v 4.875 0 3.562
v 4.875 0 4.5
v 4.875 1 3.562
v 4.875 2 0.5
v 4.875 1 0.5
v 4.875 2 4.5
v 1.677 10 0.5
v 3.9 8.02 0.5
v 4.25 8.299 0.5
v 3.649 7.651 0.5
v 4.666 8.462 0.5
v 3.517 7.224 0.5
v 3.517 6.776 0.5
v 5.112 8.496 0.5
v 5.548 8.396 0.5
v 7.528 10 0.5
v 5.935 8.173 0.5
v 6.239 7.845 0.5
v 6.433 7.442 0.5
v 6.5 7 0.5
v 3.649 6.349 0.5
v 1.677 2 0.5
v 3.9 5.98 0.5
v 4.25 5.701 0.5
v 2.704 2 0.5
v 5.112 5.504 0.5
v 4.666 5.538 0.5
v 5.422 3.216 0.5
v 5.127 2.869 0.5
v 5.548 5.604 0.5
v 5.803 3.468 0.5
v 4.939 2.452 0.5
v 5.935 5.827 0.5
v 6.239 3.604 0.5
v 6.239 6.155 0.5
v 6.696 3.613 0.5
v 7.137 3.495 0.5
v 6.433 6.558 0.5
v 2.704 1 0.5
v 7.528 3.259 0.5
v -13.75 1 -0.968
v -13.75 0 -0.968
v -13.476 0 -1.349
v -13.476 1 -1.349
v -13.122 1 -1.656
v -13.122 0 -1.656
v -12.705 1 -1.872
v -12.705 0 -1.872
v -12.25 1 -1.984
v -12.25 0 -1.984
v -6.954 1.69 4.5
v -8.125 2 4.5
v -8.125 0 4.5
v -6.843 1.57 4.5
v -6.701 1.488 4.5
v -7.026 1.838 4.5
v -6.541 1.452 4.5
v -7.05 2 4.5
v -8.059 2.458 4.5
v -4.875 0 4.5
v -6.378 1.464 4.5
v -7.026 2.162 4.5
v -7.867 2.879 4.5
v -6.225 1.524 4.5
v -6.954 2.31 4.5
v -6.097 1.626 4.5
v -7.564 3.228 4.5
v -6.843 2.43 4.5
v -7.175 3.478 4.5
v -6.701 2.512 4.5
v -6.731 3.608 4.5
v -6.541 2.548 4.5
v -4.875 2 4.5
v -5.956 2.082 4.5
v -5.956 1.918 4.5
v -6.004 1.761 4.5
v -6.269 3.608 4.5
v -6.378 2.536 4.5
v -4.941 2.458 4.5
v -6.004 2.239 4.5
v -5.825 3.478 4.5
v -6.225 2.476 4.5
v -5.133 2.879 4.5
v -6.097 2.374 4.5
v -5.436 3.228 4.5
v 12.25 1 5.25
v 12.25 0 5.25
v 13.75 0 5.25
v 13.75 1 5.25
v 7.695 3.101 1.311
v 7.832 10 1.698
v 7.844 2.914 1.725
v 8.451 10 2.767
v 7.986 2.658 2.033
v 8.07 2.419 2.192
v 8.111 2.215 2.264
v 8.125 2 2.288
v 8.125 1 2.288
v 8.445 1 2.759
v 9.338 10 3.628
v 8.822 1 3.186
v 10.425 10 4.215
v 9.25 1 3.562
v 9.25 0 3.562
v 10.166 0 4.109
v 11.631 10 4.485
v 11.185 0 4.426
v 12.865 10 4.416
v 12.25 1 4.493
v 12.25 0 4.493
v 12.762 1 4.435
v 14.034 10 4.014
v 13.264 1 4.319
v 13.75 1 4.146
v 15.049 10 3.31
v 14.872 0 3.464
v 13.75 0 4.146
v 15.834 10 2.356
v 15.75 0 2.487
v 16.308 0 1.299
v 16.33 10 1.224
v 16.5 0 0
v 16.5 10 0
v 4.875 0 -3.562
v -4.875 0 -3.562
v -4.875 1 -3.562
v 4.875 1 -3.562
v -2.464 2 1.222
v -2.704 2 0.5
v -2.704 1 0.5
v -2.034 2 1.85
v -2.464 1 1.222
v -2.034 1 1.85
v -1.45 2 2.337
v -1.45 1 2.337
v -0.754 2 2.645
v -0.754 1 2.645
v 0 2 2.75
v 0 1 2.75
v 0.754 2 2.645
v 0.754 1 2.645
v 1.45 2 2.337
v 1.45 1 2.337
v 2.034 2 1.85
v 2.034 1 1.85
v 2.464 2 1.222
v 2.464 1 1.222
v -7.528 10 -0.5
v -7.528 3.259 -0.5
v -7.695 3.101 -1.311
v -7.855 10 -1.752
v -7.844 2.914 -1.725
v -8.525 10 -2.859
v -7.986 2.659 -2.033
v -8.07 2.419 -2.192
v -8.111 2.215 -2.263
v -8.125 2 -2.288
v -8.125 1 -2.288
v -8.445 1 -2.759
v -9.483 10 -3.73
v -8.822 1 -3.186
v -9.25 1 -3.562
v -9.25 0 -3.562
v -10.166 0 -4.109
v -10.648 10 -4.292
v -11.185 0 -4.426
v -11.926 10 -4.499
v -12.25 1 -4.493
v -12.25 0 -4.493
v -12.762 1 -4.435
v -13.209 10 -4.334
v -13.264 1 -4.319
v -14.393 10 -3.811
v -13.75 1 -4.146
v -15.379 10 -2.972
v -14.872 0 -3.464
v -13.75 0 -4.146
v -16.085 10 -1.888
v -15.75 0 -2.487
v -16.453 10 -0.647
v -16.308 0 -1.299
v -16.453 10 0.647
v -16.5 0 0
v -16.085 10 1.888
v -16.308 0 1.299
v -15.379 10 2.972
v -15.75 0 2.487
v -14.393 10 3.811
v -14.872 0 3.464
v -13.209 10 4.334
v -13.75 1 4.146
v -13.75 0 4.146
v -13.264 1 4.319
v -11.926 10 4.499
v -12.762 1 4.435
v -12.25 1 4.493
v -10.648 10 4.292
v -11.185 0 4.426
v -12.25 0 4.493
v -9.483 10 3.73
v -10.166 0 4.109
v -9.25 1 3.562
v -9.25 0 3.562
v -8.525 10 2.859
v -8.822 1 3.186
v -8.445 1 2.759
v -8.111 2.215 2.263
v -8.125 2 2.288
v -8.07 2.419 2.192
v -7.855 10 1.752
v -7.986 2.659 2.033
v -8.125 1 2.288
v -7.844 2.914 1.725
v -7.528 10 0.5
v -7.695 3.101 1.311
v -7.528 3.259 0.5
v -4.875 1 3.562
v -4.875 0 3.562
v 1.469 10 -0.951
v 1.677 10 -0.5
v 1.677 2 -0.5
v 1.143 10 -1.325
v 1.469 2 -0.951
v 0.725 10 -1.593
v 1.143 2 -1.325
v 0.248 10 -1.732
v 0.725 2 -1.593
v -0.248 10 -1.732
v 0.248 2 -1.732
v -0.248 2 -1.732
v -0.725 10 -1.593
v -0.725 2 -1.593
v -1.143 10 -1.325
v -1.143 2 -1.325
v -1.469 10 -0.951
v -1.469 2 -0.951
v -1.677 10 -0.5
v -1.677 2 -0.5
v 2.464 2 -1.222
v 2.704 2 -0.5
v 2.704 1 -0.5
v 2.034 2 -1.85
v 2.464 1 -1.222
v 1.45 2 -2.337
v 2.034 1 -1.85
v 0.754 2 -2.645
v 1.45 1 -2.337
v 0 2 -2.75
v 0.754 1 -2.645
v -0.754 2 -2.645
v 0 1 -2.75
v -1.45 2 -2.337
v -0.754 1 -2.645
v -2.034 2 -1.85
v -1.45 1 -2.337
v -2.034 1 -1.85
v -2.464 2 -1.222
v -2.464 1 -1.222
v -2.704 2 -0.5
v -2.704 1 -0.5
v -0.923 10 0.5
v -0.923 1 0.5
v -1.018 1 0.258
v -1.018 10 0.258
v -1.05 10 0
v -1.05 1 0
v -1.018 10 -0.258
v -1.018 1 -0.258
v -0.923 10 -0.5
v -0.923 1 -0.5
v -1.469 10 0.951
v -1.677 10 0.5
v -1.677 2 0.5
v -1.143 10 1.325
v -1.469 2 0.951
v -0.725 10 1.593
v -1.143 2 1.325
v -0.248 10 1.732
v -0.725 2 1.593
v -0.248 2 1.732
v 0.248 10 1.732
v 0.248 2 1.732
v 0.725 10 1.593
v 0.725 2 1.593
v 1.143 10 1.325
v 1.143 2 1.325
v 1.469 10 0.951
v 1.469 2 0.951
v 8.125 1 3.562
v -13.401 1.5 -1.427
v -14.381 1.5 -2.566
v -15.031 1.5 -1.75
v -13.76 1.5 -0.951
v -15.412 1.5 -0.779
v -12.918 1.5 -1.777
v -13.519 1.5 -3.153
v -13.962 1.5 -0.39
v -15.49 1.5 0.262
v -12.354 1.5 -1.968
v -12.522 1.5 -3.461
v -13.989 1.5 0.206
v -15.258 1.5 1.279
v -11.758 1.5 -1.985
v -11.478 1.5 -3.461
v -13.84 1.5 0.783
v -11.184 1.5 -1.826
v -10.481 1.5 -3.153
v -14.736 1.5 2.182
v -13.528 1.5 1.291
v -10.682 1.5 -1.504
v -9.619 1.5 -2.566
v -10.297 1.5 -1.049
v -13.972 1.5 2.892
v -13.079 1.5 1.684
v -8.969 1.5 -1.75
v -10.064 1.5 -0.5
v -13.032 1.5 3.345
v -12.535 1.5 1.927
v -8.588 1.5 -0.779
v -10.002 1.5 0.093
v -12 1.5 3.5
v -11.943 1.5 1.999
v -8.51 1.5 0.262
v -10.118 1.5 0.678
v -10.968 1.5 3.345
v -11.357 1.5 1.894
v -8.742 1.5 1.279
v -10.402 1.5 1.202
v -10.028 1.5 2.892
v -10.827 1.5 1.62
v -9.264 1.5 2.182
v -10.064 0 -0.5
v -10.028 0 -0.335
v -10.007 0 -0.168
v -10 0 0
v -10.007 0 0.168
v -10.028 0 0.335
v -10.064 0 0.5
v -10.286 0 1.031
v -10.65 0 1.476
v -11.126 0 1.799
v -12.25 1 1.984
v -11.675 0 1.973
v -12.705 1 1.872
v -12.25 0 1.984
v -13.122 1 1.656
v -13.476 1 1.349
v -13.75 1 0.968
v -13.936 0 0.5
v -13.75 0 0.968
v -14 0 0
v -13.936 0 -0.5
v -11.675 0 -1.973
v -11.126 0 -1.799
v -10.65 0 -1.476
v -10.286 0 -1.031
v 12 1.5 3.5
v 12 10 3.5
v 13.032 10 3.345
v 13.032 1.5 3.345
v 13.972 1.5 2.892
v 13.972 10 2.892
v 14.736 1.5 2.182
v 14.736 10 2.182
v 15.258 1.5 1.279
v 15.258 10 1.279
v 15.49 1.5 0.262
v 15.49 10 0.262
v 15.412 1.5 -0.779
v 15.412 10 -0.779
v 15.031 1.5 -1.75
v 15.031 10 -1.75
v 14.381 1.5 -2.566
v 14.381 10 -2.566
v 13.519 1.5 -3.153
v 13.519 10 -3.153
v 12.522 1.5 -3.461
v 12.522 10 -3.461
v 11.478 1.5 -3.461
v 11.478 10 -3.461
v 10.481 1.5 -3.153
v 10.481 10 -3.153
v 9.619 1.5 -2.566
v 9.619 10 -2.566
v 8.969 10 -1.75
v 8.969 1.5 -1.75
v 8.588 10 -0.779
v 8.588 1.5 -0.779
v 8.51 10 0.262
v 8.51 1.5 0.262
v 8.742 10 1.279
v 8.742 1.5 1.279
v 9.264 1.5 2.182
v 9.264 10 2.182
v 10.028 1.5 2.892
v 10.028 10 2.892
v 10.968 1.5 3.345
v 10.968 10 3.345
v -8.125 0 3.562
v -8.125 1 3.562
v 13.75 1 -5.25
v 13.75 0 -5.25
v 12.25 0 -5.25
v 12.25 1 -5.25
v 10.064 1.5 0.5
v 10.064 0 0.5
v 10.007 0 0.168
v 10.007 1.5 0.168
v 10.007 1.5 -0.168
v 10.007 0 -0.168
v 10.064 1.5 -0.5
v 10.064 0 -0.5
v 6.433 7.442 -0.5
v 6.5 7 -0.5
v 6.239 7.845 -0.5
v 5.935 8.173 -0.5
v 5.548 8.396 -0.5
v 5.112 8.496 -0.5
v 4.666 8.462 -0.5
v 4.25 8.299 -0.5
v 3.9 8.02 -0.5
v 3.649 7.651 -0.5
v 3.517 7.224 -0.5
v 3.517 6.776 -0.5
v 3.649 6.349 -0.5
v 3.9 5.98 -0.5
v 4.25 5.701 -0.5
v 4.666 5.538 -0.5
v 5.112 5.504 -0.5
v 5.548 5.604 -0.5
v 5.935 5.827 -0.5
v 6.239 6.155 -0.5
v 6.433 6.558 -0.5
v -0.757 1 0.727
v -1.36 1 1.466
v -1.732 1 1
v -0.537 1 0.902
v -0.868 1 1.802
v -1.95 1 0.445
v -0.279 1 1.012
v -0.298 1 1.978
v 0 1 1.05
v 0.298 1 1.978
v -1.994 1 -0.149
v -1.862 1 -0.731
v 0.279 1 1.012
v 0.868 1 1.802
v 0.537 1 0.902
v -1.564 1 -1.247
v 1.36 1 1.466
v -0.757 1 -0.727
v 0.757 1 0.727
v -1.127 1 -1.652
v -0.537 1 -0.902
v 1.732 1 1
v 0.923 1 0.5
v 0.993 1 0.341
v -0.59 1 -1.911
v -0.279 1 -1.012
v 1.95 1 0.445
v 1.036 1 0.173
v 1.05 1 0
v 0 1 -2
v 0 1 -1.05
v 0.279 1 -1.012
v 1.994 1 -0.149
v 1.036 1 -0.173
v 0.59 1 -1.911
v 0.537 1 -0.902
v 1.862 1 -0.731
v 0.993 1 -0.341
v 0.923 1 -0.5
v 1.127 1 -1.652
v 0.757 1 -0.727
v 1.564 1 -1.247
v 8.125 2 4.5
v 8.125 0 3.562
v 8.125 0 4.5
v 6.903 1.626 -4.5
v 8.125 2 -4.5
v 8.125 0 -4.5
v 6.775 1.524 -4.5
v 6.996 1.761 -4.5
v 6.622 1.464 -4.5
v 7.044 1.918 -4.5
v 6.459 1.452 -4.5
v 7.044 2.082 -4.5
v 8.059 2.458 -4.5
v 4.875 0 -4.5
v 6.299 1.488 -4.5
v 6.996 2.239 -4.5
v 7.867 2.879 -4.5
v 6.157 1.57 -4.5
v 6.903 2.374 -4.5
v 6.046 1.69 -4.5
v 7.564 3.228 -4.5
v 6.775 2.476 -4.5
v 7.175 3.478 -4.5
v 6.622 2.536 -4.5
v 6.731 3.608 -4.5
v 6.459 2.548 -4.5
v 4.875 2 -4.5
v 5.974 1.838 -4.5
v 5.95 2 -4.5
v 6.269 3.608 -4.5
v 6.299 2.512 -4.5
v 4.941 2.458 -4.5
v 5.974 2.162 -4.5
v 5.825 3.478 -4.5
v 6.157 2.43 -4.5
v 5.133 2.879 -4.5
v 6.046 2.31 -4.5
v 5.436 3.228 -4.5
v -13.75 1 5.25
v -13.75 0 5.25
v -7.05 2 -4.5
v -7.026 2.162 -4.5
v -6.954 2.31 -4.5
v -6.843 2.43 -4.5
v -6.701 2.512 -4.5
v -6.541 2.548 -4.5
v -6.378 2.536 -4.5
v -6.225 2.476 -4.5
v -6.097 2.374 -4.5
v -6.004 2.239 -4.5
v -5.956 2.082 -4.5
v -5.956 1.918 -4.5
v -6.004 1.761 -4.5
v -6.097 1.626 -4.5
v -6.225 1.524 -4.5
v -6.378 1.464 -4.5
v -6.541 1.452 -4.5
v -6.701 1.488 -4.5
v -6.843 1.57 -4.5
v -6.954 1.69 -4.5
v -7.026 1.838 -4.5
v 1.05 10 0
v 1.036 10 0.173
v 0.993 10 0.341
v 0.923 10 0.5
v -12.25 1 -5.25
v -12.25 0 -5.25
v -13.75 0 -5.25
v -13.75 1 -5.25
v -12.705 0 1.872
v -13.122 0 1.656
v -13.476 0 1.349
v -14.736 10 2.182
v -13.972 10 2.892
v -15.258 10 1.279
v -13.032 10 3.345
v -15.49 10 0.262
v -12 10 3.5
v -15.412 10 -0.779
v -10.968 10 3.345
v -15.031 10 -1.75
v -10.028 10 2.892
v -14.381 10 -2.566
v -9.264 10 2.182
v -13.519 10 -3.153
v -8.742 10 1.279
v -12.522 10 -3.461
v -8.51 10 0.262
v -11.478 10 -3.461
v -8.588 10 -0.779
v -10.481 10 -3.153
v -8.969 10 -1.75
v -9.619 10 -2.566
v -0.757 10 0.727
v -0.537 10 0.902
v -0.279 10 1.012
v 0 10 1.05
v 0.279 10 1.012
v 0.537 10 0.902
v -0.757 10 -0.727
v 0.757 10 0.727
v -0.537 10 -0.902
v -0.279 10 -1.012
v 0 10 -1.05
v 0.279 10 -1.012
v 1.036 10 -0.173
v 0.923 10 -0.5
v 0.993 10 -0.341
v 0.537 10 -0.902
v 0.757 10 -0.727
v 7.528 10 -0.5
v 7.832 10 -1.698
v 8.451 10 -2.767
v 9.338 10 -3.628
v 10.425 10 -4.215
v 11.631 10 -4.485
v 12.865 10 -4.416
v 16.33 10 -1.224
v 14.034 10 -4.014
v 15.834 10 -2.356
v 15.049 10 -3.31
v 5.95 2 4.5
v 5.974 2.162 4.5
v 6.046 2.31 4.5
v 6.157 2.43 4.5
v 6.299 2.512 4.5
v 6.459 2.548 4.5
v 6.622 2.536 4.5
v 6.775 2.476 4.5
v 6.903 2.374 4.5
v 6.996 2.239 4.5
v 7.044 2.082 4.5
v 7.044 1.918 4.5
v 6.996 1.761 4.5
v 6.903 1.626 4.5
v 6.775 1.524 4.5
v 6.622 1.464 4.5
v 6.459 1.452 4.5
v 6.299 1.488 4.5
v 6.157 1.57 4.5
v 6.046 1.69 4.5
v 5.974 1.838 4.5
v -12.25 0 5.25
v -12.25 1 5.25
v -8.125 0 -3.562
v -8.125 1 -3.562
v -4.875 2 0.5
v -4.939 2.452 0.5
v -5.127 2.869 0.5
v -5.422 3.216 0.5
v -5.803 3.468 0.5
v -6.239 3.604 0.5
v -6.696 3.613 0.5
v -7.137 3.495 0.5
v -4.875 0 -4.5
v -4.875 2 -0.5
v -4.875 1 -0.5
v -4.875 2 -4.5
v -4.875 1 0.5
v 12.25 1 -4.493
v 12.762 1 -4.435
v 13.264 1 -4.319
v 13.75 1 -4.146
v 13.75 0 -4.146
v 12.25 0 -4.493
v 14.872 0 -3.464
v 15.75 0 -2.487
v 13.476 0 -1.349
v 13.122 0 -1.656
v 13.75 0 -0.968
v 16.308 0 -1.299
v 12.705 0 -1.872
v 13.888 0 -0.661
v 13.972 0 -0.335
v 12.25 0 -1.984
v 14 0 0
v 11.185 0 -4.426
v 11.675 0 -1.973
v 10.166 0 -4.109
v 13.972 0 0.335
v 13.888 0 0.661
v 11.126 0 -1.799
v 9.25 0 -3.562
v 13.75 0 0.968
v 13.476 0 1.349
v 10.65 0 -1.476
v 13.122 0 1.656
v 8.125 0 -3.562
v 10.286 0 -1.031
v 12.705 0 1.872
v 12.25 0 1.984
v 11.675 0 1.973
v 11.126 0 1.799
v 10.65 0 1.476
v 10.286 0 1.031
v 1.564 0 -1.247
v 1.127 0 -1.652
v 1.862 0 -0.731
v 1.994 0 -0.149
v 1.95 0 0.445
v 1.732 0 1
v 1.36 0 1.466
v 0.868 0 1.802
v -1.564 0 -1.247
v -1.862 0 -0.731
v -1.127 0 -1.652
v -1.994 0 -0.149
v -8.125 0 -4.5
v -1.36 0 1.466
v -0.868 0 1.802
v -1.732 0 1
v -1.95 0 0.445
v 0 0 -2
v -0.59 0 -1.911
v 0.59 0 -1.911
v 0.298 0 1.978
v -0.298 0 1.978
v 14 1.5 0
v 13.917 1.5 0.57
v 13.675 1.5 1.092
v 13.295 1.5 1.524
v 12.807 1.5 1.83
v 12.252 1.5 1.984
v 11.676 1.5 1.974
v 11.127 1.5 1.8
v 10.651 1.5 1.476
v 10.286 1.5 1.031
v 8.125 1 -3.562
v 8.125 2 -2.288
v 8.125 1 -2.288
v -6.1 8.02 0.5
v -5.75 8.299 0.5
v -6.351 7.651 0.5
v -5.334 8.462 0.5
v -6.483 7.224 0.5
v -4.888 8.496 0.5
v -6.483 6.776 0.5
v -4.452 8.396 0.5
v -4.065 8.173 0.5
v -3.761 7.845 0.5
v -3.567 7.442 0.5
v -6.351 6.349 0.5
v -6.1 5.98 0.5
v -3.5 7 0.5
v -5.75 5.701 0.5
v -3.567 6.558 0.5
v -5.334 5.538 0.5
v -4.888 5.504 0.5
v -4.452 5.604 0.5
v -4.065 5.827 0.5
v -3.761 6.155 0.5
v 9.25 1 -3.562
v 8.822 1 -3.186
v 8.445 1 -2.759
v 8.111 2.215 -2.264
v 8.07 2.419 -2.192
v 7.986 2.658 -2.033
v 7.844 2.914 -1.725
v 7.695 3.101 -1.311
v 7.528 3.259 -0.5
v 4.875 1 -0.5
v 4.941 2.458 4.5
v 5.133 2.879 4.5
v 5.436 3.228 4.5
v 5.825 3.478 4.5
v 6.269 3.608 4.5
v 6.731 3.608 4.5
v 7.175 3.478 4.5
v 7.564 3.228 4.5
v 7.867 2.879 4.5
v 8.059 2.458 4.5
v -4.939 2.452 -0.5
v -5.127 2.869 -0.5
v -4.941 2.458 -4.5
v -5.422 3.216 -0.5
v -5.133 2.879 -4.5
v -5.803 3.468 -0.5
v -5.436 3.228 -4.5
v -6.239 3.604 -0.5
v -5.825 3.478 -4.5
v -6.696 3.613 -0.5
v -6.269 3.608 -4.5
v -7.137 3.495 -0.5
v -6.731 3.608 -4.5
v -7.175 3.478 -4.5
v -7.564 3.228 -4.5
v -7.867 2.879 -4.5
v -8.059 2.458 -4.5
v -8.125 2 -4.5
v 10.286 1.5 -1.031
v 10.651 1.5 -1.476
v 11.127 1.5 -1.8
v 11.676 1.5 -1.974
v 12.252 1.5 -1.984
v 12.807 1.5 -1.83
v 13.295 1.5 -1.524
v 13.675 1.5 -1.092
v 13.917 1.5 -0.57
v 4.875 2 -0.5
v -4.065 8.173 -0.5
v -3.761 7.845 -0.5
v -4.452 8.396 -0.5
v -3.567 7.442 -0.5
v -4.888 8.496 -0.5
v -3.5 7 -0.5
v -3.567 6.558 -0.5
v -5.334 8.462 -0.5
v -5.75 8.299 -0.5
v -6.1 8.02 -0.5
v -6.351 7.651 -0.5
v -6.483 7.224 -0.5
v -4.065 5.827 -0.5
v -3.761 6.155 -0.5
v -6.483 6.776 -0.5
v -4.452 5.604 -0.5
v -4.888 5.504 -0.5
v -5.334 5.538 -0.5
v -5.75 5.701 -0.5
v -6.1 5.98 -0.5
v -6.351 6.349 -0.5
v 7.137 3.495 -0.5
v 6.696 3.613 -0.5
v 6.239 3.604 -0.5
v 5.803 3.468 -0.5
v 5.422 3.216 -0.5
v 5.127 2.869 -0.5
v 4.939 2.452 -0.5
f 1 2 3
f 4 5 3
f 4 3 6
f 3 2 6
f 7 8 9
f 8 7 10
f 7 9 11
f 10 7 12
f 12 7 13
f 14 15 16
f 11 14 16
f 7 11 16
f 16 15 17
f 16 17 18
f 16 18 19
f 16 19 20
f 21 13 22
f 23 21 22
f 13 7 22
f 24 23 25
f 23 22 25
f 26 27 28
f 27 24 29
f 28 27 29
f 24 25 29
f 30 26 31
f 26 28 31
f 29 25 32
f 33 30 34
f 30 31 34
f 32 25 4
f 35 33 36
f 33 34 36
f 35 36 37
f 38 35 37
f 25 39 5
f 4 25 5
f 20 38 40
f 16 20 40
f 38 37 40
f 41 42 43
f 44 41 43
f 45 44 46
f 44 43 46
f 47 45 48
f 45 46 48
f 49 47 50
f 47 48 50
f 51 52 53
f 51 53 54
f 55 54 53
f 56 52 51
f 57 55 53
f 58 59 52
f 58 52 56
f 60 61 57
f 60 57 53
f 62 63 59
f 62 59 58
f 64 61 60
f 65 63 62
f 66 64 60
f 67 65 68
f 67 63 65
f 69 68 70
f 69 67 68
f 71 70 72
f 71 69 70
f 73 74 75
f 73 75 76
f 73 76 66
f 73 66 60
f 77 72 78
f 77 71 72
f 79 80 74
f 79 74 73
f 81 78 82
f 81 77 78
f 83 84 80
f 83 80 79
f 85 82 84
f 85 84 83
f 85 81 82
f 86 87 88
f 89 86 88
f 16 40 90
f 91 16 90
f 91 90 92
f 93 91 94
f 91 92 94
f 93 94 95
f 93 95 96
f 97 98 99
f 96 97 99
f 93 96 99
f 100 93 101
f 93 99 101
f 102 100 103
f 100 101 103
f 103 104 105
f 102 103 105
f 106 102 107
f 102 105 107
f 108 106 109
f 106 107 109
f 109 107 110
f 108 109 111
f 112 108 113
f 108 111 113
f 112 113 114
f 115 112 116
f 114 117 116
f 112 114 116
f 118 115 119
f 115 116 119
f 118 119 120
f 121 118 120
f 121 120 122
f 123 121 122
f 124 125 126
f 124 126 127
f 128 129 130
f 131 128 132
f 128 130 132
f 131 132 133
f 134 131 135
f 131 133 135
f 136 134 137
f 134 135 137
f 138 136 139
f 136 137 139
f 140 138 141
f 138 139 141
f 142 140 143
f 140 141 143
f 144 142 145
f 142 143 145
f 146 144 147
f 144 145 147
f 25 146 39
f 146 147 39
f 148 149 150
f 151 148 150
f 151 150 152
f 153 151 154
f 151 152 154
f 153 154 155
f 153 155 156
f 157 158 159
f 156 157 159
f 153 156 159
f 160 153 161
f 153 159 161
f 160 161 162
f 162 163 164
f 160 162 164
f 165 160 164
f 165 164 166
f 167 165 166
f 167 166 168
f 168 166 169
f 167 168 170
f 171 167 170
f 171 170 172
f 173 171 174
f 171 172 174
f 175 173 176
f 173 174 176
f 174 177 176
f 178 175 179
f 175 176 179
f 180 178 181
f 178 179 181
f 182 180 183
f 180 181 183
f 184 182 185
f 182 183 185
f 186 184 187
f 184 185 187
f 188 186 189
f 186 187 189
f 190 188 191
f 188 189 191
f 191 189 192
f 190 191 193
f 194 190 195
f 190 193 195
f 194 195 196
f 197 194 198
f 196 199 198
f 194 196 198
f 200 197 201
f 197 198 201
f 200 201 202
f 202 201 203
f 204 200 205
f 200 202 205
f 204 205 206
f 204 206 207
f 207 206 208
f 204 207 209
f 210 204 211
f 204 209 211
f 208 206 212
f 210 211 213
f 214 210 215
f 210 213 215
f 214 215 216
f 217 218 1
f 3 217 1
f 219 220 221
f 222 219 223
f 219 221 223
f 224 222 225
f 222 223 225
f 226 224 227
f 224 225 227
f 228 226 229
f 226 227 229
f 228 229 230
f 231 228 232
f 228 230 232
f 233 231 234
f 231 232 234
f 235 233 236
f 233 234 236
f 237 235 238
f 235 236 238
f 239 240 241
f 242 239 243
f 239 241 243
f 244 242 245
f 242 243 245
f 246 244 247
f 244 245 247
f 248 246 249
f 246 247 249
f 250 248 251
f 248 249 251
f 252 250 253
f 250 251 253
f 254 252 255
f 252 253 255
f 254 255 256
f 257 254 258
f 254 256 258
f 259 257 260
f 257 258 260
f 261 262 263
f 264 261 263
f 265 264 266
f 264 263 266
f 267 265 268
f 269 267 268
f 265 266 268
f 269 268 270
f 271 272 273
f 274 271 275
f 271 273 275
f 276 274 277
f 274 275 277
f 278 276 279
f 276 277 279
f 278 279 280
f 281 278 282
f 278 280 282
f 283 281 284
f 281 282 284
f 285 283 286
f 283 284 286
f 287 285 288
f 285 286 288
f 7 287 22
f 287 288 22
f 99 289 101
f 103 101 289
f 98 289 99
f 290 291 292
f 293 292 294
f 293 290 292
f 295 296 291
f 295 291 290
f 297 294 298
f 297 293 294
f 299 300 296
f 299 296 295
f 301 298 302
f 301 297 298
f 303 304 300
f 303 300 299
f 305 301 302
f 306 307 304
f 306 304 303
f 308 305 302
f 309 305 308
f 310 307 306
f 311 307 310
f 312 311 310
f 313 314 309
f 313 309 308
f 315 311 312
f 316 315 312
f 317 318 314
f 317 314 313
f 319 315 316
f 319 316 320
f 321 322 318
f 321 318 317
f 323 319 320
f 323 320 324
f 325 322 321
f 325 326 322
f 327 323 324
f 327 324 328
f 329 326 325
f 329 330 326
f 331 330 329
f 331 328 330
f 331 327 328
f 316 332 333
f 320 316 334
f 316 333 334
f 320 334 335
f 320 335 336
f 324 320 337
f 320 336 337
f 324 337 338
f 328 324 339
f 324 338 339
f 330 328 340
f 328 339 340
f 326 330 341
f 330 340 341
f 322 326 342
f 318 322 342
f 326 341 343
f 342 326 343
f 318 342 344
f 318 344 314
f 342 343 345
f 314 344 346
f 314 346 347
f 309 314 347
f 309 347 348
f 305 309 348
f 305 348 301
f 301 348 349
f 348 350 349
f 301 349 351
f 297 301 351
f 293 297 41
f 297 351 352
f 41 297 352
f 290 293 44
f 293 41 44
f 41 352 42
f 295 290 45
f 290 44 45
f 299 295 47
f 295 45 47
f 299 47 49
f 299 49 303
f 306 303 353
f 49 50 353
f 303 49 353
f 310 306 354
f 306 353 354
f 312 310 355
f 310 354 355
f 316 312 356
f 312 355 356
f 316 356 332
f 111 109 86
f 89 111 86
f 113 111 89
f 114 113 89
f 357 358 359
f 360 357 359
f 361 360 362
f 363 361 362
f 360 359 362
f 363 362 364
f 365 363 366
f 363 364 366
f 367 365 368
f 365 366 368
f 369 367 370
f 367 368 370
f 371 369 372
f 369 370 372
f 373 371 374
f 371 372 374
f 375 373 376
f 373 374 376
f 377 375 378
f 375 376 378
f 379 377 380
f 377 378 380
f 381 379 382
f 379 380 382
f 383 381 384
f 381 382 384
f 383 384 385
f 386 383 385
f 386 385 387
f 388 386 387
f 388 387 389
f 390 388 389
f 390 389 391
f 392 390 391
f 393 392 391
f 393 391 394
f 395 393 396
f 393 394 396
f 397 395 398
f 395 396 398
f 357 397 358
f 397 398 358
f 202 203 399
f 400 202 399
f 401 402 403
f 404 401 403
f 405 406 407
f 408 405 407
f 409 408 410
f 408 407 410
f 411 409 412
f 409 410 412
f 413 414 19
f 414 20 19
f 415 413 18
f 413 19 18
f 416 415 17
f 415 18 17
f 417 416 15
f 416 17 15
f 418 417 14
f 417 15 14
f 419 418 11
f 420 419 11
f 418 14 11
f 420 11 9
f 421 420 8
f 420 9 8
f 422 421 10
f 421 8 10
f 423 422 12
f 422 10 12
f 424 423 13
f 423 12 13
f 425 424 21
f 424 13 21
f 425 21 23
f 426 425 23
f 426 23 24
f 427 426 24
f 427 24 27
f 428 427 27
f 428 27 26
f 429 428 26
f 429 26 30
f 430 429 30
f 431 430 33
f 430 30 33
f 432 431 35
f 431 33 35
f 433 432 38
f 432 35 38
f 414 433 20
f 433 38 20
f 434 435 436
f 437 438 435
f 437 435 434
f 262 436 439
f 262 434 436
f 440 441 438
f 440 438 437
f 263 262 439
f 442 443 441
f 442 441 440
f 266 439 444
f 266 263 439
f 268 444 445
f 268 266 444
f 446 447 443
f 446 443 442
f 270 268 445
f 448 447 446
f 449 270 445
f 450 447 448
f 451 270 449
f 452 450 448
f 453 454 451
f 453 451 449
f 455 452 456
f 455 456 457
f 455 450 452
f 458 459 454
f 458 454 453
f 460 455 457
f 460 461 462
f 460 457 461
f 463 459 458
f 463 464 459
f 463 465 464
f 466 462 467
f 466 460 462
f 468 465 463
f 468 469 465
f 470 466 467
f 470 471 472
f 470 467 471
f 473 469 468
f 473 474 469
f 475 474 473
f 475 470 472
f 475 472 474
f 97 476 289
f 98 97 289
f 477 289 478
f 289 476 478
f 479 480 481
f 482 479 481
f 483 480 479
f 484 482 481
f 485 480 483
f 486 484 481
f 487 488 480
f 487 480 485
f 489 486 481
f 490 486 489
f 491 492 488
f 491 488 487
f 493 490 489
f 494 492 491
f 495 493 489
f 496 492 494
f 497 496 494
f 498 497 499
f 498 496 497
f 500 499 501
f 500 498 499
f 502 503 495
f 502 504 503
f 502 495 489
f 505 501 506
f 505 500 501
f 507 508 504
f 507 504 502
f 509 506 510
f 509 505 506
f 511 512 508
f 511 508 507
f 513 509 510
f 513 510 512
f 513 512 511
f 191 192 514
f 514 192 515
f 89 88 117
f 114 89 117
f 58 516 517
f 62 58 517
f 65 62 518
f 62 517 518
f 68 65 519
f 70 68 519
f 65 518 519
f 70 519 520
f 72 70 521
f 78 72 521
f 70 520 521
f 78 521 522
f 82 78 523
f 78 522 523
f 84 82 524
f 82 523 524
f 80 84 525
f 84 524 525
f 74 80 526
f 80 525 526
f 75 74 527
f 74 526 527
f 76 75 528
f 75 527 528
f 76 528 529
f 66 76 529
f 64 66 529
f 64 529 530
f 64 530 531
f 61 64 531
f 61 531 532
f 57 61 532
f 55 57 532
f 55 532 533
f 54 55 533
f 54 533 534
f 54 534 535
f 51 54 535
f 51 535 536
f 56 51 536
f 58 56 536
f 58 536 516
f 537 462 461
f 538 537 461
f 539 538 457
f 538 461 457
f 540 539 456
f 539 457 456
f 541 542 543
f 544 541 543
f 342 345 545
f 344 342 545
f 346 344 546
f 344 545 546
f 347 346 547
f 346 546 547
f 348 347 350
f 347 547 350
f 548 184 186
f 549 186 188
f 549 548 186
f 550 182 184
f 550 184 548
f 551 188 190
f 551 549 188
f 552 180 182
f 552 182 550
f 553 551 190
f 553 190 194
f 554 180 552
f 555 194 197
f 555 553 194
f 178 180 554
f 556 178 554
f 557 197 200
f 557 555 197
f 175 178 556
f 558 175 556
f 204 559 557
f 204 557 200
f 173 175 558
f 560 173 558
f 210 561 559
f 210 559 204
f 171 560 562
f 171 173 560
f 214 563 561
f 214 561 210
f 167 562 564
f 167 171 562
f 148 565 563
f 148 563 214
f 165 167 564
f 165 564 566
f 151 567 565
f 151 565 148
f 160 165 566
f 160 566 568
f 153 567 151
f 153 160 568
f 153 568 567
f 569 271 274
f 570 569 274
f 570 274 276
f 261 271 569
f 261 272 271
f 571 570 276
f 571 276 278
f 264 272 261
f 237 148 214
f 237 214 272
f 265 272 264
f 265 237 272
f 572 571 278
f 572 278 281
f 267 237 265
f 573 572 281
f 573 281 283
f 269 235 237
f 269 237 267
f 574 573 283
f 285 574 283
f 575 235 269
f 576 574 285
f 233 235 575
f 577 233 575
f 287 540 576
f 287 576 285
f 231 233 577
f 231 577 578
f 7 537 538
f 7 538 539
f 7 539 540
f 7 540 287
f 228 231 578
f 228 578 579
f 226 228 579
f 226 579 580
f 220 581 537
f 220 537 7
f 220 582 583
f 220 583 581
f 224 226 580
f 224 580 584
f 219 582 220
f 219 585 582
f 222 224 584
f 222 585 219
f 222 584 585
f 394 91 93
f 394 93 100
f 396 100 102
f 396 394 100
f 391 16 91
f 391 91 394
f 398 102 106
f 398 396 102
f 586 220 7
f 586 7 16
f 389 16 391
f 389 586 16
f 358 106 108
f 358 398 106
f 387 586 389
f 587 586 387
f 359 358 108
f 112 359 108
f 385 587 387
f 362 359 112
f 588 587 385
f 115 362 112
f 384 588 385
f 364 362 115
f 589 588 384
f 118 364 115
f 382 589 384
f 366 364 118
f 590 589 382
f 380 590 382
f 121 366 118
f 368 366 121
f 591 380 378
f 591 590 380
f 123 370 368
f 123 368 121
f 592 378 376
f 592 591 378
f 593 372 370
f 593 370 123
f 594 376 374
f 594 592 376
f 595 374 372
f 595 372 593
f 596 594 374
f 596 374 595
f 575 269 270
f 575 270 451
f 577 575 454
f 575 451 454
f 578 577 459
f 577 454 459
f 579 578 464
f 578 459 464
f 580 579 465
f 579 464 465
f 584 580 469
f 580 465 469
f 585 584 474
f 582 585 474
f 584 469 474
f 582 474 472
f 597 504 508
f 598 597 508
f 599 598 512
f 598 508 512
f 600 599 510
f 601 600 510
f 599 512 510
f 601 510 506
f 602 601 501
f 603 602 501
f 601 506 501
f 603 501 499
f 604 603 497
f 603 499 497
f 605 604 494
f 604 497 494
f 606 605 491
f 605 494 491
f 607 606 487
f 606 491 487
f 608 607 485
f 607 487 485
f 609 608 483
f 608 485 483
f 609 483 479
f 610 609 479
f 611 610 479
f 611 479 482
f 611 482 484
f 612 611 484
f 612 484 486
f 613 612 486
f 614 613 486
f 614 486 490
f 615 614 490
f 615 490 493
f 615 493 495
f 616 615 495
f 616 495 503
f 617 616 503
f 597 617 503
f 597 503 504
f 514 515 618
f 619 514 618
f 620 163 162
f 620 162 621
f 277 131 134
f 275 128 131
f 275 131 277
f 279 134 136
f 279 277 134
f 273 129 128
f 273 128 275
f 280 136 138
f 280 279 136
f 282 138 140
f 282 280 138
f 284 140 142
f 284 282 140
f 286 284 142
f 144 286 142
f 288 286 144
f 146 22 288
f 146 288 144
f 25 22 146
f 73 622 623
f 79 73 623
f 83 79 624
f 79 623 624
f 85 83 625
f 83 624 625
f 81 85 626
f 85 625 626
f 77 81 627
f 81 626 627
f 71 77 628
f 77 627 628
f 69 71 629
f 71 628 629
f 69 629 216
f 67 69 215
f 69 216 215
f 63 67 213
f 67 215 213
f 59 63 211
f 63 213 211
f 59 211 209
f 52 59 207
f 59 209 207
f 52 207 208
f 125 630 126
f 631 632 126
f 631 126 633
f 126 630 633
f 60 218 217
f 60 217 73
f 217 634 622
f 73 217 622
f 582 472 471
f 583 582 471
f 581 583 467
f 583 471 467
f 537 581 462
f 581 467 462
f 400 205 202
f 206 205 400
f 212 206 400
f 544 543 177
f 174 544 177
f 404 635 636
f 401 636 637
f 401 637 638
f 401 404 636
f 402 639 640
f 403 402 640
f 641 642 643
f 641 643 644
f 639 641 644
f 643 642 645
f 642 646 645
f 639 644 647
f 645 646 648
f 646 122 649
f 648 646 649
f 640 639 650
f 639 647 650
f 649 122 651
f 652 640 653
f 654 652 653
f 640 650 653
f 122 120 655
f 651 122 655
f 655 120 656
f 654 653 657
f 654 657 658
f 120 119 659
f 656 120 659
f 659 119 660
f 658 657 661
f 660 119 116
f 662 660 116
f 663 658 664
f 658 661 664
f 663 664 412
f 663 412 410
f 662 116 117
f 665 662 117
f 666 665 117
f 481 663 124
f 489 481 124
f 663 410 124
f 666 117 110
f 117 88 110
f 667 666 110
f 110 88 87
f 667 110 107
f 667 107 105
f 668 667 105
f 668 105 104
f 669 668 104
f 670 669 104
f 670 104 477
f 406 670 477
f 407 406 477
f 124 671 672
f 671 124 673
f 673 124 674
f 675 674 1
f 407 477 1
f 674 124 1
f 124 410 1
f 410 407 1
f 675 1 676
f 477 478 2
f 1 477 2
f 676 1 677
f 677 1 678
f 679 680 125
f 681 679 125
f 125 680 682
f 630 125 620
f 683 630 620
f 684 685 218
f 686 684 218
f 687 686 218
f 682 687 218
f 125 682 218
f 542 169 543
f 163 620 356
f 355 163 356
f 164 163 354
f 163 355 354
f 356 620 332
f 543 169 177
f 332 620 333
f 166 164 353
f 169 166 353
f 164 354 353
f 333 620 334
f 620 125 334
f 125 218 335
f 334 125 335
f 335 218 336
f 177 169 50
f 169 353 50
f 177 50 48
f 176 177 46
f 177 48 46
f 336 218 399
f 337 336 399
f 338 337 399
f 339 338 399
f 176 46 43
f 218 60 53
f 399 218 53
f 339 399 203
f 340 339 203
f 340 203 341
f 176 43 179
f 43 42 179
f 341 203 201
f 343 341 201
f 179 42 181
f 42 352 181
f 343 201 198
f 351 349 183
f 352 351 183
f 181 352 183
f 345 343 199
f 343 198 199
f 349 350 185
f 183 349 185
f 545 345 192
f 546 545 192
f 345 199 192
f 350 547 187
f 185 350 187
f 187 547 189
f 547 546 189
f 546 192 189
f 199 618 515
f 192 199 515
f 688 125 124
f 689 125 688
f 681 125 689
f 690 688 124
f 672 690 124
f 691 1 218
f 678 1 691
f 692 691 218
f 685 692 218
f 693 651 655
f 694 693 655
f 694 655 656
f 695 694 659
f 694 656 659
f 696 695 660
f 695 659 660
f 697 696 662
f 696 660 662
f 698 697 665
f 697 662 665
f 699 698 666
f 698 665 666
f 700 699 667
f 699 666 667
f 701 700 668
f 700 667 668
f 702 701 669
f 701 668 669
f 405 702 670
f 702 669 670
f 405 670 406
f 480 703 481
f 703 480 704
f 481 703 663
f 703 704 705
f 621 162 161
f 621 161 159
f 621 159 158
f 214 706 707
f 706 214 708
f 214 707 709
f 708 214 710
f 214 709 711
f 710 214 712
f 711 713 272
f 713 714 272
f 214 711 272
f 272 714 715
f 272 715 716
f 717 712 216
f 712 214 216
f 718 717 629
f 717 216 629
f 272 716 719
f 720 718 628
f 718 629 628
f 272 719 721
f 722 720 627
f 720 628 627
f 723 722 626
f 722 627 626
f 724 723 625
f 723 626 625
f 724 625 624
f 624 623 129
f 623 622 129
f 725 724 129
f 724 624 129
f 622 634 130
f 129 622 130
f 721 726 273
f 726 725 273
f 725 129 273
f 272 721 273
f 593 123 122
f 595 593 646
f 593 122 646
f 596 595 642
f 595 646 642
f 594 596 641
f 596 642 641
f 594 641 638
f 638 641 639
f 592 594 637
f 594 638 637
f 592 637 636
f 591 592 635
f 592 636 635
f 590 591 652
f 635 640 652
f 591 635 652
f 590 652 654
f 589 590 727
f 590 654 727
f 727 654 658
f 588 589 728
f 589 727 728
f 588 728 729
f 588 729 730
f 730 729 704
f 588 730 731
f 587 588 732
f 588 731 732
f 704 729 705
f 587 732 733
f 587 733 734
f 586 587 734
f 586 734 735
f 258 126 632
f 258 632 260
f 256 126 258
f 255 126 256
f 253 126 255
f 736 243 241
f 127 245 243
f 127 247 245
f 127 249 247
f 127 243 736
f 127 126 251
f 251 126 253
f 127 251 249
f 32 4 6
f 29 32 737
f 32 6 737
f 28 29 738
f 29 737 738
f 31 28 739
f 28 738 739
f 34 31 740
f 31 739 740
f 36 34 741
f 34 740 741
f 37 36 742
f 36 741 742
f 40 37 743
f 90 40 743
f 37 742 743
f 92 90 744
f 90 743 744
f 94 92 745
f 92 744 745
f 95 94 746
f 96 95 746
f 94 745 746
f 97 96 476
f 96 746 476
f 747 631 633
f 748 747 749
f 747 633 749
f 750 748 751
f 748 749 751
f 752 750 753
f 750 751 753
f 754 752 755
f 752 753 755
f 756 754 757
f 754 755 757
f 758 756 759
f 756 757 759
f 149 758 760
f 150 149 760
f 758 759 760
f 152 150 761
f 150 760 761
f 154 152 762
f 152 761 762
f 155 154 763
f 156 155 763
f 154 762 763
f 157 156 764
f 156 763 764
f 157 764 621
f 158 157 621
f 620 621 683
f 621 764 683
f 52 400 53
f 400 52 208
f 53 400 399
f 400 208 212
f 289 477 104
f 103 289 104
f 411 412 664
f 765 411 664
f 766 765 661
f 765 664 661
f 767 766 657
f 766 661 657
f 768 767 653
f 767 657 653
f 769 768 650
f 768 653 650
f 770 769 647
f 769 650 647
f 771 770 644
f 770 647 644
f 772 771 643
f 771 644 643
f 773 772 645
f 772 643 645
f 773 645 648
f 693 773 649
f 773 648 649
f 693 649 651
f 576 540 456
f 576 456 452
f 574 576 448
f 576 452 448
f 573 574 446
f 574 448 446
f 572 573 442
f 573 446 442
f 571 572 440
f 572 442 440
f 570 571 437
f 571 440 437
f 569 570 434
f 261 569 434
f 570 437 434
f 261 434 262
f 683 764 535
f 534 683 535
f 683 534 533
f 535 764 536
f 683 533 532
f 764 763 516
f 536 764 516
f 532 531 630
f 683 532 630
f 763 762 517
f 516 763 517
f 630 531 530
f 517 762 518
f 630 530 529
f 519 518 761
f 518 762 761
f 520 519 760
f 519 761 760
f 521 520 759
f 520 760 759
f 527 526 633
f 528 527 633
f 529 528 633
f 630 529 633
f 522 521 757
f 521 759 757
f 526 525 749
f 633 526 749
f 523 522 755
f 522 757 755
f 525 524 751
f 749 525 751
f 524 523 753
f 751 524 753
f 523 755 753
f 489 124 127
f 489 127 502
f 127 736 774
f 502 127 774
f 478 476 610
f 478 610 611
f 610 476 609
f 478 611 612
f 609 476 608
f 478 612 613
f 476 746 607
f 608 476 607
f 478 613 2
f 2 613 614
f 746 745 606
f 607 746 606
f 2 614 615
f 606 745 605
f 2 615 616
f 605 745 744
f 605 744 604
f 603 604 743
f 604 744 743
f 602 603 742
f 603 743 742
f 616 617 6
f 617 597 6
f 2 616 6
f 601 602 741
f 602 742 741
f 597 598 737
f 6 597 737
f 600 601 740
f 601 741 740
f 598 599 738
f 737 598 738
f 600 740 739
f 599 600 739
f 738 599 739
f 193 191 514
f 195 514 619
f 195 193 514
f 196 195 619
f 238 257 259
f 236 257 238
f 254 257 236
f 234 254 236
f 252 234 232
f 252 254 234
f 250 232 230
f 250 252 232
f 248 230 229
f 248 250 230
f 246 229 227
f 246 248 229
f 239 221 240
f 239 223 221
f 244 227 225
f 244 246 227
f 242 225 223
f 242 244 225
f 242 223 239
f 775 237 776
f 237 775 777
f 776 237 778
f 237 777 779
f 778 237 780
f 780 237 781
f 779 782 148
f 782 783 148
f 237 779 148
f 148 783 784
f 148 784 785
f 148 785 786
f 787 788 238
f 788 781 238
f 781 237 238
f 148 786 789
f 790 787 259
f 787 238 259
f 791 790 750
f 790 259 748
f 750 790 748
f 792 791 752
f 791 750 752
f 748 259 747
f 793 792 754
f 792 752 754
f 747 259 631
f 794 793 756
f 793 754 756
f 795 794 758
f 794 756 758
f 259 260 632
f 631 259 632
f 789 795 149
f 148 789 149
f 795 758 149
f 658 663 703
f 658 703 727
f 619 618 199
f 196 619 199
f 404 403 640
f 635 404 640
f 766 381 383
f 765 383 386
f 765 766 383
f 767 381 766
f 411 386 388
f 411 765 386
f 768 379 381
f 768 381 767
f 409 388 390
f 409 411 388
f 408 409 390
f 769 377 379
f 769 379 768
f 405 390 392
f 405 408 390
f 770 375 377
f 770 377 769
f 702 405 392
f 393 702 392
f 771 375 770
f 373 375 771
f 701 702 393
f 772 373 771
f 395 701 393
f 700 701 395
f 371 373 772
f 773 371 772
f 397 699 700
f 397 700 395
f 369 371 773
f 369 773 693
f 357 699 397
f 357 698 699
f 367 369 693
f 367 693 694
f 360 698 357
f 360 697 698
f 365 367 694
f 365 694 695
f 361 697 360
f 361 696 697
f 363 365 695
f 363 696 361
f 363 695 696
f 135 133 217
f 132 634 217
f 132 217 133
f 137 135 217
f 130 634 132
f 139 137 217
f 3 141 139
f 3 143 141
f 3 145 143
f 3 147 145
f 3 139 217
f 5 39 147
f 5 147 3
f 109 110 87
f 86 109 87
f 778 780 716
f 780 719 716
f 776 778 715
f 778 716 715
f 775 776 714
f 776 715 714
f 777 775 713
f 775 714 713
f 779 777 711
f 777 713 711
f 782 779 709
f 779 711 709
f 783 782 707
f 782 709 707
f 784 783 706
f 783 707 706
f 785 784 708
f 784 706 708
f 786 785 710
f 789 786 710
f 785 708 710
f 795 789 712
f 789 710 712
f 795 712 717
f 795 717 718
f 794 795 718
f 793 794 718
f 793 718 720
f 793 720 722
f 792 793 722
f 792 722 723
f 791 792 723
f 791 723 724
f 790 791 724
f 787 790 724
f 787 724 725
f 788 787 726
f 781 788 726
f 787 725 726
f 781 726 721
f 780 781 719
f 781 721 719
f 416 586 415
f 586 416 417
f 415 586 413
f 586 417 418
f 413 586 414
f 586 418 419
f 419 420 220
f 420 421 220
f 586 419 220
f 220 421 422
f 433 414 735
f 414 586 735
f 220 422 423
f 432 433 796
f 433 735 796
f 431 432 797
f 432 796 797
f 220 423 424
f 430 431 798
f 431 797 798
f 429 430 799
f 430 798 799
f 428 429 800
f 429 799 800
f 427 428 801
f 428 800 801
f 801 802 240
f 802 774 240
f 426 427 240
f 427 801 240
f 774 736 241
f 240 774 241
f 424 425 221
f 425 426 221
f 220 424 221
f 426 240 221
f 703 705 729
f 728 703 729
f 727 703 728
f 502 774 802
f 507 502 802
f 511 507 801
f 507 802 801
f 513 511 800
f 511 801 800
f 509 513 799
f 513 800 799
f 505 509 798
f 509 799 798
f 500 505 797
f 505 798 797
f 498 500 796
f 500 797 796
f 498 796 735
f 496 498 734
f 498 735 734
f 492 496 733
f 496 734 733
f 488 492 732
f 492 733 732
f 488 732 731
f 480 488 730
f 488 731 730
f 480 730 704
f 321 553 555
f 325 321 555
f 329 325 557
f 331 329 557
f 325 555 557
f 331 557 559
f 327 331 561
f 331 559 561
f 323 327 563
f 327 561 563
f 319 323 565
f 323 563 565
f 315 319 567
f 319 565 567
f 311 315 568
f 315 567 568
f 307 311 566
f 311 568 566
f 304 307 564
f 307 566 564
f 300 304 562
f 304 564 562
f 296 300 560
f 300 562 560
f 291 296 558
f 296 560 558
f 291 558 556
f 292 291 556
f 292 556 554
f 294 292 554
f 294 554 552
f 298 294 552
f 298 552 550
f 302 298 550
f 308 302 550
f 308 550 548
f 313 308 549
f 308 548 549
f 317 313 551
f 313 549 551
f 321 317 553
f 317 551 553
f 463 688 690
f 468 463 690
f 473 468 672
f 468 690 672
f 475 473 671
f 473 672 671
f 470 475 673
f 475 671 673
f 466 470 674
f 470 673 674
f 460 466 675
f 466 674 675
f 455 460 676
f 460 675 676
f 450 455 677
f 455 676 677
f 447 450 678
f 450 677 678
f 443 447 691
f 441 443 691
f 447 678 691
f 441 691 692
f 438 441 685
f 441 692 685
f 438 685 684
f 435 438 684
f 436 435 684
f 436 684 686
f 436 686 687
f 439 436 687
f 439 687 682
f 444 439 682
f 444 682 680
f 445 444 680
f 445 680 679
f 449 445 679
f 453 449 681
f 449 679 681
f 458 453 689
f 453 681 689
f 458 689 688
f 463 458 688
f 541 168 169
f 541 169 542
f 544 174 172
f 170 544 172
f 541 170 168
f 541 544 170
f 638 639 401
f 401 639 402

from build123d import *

# Parameters (mm, degrees)
BOSS_EXTRUDE1_DEPTH     = 10
SKETCH2_W               = 18.5
SKETCH2_H               = 7.123903424
SKETCH2_R               = 1.05
BOSS_EXTRUDE2_DEPTH     = 1
SKETCH3_R               = 3.5
CUT_EXTRUDE1_DEPTH      = 8.5
BOSS_EXTRUDE3_DEPTH     = 4.5
SKETCH5_R               = 1.5
CUT_EXTRUDE2_DEPTH      = 4.5
M1_4X0_3_TAPPED_HOLE1_D = 1.1
SKETCH7_R               = 2.75
SKETCH7_R_2             = 1.75
BOSS_EXTRUDE4_DEPTH     = 1
SKETCH8_R               = 2
CUT_EXTRUDE3_DEPTH      = 1


with BuildPart() as part:
    # Sketch1 → Boss-Extrude1 (new body)
    with BuildSketch(Plane(origin=(0, 0, 0), x_dir=(1, 0, 0), z_dir=(0, 1, 0))):
        with BuildLine():
            ThreePointArc((10.063508327, -0.5), (10, 0), (10.063508327, 0.5))
            Line((10.063508327, 0.5), (7.527864045, 0.5))
            ThreePointArc((7.527864045, 0.5), (7.5, 0), (7.527864045, -0.5))
            Line((7.527864045, -0.5), (10.063508327, -0.5))
        make_face()
        with BuildLine():
            Line((7.527864045, 0.5), (10.063508327, 0.5))
            ThreePointArc((10.063508327, 0.5), (12.252008585, 1.984059393), (14, 0))
            ThreePointArc((14, 0), (12.252008585, -1.984059393), (10.063508327, -0.5))
            Line((10.063508327, -0.5), (7.527864045, -0.5))
            ThreePointArc((7.527864045, -0.5), (12.250387902, -4.493028589), (16.5, 0))
            ThreePointArc((16.5, 0), (12.250387902, 4.493028589), (7.527864045, 0.5))
        make_face()
        with BuildLine():
            ThreePointArc((-7.5, 0), (-7.506971411, 0.250387902), (-7.527864045, 0.5))
            Line((-7.527864045, 0.5), (-10.063508327, 0.5))
            ThreePointArc((-10.063508327, 0.5), (-10.015940607, 0.252008585), (-10, 0))
            ThreePointArc((-10, 0), (-10.015940607, -0.252008585), (-10.063508327, -0.5))
            Line((-10.063508327, -0.5), (-7.527864045, -0.5))
            ThreePointArc((-7.527864045, -0.5), (-7.506971411, -0.250387902), (-7.5, 0))
        make_face()
        with BuildLine():
            Line((-10.063508327, 0.5), (-7.527864045, 0.5))
            ThreePointArc((-7.527864045, 0.5), (-16.5, 0), (-7.527864045, -0.5))
            Line((-7.527864045, -0.5), (-10.063508327, -0.5))
            ThreePointArc((-10.063508327, -0.5), (-14, 0), (-10.063508327, 0.5))
        make_face()
        with BuildLine():
            ThreePointArc((7.527864045, -0.5), (7.5, 0), (7.527864045, 0.5))
            Line((7.527864045, 0.5), (1.677050983, 0.5))
            ThreePointArc((1.677050983, 0.5), (1.731666715, 0.252646769), (1.75, 0))
            ThreePointArc((1.75, 0), (1.731666715, -0.252646769), (1.677050983, -0.5))
            Line((1.677050983, -0.5), (7.527864045, -0.5))
        make_face()
        with BuildLine():
            ThreePointArc((-1.677050983, -0.5), (-1.75, 0), (-1.677050983, 0.5))
            Line((-1.677050983, 0.5), (-7.527864045, 0.5))
            ThreePointArc((-7.527864045, 0.5), (-7.506971411, 0.250387902), (-7.5, 0))
            ThreePointArc((-7.5, 0), (-7.506971411, -0.250387902), (-7.527864045, -0.5))
            Line((-7.527864045, -0.5), (-1.677050983, -0.5))
        make_face()
        with BuildLine():
            ThreePointArc((1.75, 0), (1.731666715, 0.252646769), (1.677050983, 0.5))
            Line((1.677050983, 0.5), (0.923309266, 0.5))
            ThreePointArc((0.923309266, 0.5), (1.017834645, 0.257900437), (1.05, 0))
            ThreePointArc((1.05, 0), (1.017834645, -0.257900437), (0.923309266, -0.5))
            Line((0.923309266, -0.5), (1.677050983, -0.5))
            ThreePointArc((1.677050983, -0.5), (1.731666715, -0.252646769), (1.75, 0))
        make_face()
        with BuildLine():
            Line((-0.923309266, 0.5), (-1.677050983, 0.5))
            ThreePointArc((-1.677050983, 0.5), (-1.75, 0), (-1.677050983, -0.5))
            Line((-1.677050983, -0.5), (-0.923309266, -0.5))
            ThreePointArc((-0.923309266, -0.5), (-1.05, 0), (-0.923309266, 0.5))
        make_face()
        with BuildLine():
            Line((0.923309266, 0.5), (1.677050983, 0.5))
            ThreePointArc((1.677050983, 0.5), (0, 1.75), (-1.677050983, 0.5))
            Line((-1.677050983, 0.5), (-0.923309266, 0.5))
            ThreePointArc((-0.923309266, 0.5), (0, 1.05), (0.923309266, 0.5))
        make_face()
        with BuildLine():
            ThreePointArc((-1.677050983, -0.5), (0, -1.75), (1.677050983, -0.5))
            Line((1.677050983, -0.5), (0.923309266, -0.5))
            ThreePointArc((0.923309266, -0.5), (0, -1.05), (-0.923309266, -0.5))
            Line((-0.923309266, -0.5), (-1.677050983, -0.5))
        make_face()
    extrude(amount=BOSS_EXTRUDE1_DEPTH)

    # Sketch2 → Boss-Extrude2 (add)
    # profile 1 of 5: a face of its own
    with BuildSketch(Plane(origin=(0, 0, 0), x_dir=(1, 0, 0), z_dir=(0, 1, 0))):
        with BuildLine():
            Line((-12.25, 5.25), (-13.75, 5.25))
            Line((-13.75, 5.25), (-13.75, 0.968245837))
            ThreePointArc((-13.75, 0.968245837), (-13.121649841, 1.655868846), (-12.25, 1.984313483))
            Line((-12.25, 1.984313483), (-12.25, 5.25))
        make_face()
    # profile 2 of 5: a face of its own
    with BuildSketch(Plane(origin=(0, 0, 0), x_dir=(1, 0, 0), z_dir=(0, 1, 0))):
        with BuildLine():
            ThreePointArc((-12.25, -1.984313483), (-13.121649841, -1.655868846), (-13.75, -0.968245837))
            Line((-13.75, -0.968245837), (-13.75, -5.25))
            Line((-13.75, -5.25), (-12.25, -5.25))
            Line((-12.25, -5.25), (-12.25, -1.984313483))
        make_face()
    # profile 3 of 5: a face of its own
    with BuildSketch(Plane(origin=(0, 0, 0), x_dir=(1, 0, 0), z_dir=(0, 1, 0))):
        with BuildLine():
            Line((13.75, 5.25), (12.25, 5.25))
            Line((12.25, 5.25), (12.25, 1.984313483))
            ThreePointArc((12.25, 1.984313483), (13.121649841, 1.655868846), (13.75, 0.968245837))
            Line((13.75, 0.968245837), (13.75, 5.25))
        make_face()
    # profile 4 of 5: a face of its own
    with BuildSketch(Plane(origin=(0, 0, 0), x_dir=(1, 0, 0), z_dir=(0, 1, 0))):
        with BuildLine():
            ThreePointArc((13.75, -0.968245837), (13.121649841, -1.655868846), (12.25, -1.984313483))
            Line((12.25, -1.984313483), (12.25, -5.25))
            Line((12.25, -5.25), (13.75, -5.25))
            Line((13.75, -5.25), (13.75, -0.968245837))
        make_face()
    # profile 5 of 5: a face of its own
    with BuildSketch(Plane(origin=(0, 0, 0), x_dir=(1, 0, 0), z_dir=(0, 1, 0))):
        Rectangle(SKETCH2_W, SKETCH2_H)
        with Locations(Location((0, 0, 0), (0, 0, 270))):
            Circle(SKETCH2_R, mode=Mode.SUBTRACT)
    extrude(amount=BOSS_EXTRUDE2_DEPTH)

    # Sketch3 → Cut-Extrude1 (cut)
    with BuildSketch(Plane(origin=(0, 10, 0), x_dir=(1, 0, 0), z_dir=(0, 1, 0))):
        with Locations(Location((-12, 0, 0), (0, 0, 270))):
            Circle(SKETCH3_R)
        with Locations(Location((12, 0, 0), (0, 0, 270))):
            Circle(SKETCH3_R)
    extrude(amount=-CUT_EXTRUDE1_DEPTH, mode=Mode.SUBTRACT)

    # Sketch4 → Boss-Extrude3 (add, symmetric)
    with BuildSketch(Plane.XY):
        with BuildLine():
            Line((-8.125, 0), (-4.875, 0))
            Line((-4.875, 0), (-4.875, 2))
            ThreePointArc((-4.875, 2), (-6.5, 3.625), (-8.125, 2))
            Line((-8.125, 2), (-8.125, 0))
        make_face()
        with BuildLine():
            Line((8.125, 0), (4.875, 0))
            Line((4.875, 0), (4.875, 2))
            ThreePointArc((4.875, 2), (6.5, 3.625), (8.125, 2))
            Line((8.125, 2), (8.125, 0))
        make_face()
    extrude(amount=BOSS_EXTRUDE3_DEPTH, both=True)

    # Sketch5 → Cut-Extrude2 (cut, symmetric)
    with BuildSketch(Plane.XY):
        with Locations((-5, 7)):
            Circle(SKETCH5_R)
        with Locations((5, 7)):
            Circle(SKETCH5_R)
    extrude(amount=CUT_EXTRUDE2_DEPTH, both=True, mode=Mode.SUBTRACT)

    # M1.4x0.3 Tapped Hole1 (through all)
    with Locations(Plane(origin=(-6.5, 2, 4.5), x_dir=(1, 0, 0), z_dir=(0, 0, 1))):
        with Locations((0, 0), (13, 0)):
            Hole(M1_4X0_3_TAPPED_HOLE1_D / 2)

    # Sketch7 → Boss-Extrude4 (add)
    with BuildSketch(Plane(origin=(0, 1, 0), x_dir=(1, 0, 0), z_dir=(0, 1, 0))):
        Circle(SKETCH7_R)
        Circle(SKETCH7_R_2, mode=Mode.SUBTRACT)
    extrude(amount=BOSS_EXTRUDE4_DEPTH)

    # Sketch8 → Cut-Extrude3 (cut)
    with BuildSketch(Plane.XZ):
        with Locations(Location((0, 0, 0), (0, 0, 270))):
            Circle(SKETCH8_R)
    extrude(amount=-CUT_EXTRUDE3_DEPTH, mode=Mode.SUBTRACT)


solid = part.part
